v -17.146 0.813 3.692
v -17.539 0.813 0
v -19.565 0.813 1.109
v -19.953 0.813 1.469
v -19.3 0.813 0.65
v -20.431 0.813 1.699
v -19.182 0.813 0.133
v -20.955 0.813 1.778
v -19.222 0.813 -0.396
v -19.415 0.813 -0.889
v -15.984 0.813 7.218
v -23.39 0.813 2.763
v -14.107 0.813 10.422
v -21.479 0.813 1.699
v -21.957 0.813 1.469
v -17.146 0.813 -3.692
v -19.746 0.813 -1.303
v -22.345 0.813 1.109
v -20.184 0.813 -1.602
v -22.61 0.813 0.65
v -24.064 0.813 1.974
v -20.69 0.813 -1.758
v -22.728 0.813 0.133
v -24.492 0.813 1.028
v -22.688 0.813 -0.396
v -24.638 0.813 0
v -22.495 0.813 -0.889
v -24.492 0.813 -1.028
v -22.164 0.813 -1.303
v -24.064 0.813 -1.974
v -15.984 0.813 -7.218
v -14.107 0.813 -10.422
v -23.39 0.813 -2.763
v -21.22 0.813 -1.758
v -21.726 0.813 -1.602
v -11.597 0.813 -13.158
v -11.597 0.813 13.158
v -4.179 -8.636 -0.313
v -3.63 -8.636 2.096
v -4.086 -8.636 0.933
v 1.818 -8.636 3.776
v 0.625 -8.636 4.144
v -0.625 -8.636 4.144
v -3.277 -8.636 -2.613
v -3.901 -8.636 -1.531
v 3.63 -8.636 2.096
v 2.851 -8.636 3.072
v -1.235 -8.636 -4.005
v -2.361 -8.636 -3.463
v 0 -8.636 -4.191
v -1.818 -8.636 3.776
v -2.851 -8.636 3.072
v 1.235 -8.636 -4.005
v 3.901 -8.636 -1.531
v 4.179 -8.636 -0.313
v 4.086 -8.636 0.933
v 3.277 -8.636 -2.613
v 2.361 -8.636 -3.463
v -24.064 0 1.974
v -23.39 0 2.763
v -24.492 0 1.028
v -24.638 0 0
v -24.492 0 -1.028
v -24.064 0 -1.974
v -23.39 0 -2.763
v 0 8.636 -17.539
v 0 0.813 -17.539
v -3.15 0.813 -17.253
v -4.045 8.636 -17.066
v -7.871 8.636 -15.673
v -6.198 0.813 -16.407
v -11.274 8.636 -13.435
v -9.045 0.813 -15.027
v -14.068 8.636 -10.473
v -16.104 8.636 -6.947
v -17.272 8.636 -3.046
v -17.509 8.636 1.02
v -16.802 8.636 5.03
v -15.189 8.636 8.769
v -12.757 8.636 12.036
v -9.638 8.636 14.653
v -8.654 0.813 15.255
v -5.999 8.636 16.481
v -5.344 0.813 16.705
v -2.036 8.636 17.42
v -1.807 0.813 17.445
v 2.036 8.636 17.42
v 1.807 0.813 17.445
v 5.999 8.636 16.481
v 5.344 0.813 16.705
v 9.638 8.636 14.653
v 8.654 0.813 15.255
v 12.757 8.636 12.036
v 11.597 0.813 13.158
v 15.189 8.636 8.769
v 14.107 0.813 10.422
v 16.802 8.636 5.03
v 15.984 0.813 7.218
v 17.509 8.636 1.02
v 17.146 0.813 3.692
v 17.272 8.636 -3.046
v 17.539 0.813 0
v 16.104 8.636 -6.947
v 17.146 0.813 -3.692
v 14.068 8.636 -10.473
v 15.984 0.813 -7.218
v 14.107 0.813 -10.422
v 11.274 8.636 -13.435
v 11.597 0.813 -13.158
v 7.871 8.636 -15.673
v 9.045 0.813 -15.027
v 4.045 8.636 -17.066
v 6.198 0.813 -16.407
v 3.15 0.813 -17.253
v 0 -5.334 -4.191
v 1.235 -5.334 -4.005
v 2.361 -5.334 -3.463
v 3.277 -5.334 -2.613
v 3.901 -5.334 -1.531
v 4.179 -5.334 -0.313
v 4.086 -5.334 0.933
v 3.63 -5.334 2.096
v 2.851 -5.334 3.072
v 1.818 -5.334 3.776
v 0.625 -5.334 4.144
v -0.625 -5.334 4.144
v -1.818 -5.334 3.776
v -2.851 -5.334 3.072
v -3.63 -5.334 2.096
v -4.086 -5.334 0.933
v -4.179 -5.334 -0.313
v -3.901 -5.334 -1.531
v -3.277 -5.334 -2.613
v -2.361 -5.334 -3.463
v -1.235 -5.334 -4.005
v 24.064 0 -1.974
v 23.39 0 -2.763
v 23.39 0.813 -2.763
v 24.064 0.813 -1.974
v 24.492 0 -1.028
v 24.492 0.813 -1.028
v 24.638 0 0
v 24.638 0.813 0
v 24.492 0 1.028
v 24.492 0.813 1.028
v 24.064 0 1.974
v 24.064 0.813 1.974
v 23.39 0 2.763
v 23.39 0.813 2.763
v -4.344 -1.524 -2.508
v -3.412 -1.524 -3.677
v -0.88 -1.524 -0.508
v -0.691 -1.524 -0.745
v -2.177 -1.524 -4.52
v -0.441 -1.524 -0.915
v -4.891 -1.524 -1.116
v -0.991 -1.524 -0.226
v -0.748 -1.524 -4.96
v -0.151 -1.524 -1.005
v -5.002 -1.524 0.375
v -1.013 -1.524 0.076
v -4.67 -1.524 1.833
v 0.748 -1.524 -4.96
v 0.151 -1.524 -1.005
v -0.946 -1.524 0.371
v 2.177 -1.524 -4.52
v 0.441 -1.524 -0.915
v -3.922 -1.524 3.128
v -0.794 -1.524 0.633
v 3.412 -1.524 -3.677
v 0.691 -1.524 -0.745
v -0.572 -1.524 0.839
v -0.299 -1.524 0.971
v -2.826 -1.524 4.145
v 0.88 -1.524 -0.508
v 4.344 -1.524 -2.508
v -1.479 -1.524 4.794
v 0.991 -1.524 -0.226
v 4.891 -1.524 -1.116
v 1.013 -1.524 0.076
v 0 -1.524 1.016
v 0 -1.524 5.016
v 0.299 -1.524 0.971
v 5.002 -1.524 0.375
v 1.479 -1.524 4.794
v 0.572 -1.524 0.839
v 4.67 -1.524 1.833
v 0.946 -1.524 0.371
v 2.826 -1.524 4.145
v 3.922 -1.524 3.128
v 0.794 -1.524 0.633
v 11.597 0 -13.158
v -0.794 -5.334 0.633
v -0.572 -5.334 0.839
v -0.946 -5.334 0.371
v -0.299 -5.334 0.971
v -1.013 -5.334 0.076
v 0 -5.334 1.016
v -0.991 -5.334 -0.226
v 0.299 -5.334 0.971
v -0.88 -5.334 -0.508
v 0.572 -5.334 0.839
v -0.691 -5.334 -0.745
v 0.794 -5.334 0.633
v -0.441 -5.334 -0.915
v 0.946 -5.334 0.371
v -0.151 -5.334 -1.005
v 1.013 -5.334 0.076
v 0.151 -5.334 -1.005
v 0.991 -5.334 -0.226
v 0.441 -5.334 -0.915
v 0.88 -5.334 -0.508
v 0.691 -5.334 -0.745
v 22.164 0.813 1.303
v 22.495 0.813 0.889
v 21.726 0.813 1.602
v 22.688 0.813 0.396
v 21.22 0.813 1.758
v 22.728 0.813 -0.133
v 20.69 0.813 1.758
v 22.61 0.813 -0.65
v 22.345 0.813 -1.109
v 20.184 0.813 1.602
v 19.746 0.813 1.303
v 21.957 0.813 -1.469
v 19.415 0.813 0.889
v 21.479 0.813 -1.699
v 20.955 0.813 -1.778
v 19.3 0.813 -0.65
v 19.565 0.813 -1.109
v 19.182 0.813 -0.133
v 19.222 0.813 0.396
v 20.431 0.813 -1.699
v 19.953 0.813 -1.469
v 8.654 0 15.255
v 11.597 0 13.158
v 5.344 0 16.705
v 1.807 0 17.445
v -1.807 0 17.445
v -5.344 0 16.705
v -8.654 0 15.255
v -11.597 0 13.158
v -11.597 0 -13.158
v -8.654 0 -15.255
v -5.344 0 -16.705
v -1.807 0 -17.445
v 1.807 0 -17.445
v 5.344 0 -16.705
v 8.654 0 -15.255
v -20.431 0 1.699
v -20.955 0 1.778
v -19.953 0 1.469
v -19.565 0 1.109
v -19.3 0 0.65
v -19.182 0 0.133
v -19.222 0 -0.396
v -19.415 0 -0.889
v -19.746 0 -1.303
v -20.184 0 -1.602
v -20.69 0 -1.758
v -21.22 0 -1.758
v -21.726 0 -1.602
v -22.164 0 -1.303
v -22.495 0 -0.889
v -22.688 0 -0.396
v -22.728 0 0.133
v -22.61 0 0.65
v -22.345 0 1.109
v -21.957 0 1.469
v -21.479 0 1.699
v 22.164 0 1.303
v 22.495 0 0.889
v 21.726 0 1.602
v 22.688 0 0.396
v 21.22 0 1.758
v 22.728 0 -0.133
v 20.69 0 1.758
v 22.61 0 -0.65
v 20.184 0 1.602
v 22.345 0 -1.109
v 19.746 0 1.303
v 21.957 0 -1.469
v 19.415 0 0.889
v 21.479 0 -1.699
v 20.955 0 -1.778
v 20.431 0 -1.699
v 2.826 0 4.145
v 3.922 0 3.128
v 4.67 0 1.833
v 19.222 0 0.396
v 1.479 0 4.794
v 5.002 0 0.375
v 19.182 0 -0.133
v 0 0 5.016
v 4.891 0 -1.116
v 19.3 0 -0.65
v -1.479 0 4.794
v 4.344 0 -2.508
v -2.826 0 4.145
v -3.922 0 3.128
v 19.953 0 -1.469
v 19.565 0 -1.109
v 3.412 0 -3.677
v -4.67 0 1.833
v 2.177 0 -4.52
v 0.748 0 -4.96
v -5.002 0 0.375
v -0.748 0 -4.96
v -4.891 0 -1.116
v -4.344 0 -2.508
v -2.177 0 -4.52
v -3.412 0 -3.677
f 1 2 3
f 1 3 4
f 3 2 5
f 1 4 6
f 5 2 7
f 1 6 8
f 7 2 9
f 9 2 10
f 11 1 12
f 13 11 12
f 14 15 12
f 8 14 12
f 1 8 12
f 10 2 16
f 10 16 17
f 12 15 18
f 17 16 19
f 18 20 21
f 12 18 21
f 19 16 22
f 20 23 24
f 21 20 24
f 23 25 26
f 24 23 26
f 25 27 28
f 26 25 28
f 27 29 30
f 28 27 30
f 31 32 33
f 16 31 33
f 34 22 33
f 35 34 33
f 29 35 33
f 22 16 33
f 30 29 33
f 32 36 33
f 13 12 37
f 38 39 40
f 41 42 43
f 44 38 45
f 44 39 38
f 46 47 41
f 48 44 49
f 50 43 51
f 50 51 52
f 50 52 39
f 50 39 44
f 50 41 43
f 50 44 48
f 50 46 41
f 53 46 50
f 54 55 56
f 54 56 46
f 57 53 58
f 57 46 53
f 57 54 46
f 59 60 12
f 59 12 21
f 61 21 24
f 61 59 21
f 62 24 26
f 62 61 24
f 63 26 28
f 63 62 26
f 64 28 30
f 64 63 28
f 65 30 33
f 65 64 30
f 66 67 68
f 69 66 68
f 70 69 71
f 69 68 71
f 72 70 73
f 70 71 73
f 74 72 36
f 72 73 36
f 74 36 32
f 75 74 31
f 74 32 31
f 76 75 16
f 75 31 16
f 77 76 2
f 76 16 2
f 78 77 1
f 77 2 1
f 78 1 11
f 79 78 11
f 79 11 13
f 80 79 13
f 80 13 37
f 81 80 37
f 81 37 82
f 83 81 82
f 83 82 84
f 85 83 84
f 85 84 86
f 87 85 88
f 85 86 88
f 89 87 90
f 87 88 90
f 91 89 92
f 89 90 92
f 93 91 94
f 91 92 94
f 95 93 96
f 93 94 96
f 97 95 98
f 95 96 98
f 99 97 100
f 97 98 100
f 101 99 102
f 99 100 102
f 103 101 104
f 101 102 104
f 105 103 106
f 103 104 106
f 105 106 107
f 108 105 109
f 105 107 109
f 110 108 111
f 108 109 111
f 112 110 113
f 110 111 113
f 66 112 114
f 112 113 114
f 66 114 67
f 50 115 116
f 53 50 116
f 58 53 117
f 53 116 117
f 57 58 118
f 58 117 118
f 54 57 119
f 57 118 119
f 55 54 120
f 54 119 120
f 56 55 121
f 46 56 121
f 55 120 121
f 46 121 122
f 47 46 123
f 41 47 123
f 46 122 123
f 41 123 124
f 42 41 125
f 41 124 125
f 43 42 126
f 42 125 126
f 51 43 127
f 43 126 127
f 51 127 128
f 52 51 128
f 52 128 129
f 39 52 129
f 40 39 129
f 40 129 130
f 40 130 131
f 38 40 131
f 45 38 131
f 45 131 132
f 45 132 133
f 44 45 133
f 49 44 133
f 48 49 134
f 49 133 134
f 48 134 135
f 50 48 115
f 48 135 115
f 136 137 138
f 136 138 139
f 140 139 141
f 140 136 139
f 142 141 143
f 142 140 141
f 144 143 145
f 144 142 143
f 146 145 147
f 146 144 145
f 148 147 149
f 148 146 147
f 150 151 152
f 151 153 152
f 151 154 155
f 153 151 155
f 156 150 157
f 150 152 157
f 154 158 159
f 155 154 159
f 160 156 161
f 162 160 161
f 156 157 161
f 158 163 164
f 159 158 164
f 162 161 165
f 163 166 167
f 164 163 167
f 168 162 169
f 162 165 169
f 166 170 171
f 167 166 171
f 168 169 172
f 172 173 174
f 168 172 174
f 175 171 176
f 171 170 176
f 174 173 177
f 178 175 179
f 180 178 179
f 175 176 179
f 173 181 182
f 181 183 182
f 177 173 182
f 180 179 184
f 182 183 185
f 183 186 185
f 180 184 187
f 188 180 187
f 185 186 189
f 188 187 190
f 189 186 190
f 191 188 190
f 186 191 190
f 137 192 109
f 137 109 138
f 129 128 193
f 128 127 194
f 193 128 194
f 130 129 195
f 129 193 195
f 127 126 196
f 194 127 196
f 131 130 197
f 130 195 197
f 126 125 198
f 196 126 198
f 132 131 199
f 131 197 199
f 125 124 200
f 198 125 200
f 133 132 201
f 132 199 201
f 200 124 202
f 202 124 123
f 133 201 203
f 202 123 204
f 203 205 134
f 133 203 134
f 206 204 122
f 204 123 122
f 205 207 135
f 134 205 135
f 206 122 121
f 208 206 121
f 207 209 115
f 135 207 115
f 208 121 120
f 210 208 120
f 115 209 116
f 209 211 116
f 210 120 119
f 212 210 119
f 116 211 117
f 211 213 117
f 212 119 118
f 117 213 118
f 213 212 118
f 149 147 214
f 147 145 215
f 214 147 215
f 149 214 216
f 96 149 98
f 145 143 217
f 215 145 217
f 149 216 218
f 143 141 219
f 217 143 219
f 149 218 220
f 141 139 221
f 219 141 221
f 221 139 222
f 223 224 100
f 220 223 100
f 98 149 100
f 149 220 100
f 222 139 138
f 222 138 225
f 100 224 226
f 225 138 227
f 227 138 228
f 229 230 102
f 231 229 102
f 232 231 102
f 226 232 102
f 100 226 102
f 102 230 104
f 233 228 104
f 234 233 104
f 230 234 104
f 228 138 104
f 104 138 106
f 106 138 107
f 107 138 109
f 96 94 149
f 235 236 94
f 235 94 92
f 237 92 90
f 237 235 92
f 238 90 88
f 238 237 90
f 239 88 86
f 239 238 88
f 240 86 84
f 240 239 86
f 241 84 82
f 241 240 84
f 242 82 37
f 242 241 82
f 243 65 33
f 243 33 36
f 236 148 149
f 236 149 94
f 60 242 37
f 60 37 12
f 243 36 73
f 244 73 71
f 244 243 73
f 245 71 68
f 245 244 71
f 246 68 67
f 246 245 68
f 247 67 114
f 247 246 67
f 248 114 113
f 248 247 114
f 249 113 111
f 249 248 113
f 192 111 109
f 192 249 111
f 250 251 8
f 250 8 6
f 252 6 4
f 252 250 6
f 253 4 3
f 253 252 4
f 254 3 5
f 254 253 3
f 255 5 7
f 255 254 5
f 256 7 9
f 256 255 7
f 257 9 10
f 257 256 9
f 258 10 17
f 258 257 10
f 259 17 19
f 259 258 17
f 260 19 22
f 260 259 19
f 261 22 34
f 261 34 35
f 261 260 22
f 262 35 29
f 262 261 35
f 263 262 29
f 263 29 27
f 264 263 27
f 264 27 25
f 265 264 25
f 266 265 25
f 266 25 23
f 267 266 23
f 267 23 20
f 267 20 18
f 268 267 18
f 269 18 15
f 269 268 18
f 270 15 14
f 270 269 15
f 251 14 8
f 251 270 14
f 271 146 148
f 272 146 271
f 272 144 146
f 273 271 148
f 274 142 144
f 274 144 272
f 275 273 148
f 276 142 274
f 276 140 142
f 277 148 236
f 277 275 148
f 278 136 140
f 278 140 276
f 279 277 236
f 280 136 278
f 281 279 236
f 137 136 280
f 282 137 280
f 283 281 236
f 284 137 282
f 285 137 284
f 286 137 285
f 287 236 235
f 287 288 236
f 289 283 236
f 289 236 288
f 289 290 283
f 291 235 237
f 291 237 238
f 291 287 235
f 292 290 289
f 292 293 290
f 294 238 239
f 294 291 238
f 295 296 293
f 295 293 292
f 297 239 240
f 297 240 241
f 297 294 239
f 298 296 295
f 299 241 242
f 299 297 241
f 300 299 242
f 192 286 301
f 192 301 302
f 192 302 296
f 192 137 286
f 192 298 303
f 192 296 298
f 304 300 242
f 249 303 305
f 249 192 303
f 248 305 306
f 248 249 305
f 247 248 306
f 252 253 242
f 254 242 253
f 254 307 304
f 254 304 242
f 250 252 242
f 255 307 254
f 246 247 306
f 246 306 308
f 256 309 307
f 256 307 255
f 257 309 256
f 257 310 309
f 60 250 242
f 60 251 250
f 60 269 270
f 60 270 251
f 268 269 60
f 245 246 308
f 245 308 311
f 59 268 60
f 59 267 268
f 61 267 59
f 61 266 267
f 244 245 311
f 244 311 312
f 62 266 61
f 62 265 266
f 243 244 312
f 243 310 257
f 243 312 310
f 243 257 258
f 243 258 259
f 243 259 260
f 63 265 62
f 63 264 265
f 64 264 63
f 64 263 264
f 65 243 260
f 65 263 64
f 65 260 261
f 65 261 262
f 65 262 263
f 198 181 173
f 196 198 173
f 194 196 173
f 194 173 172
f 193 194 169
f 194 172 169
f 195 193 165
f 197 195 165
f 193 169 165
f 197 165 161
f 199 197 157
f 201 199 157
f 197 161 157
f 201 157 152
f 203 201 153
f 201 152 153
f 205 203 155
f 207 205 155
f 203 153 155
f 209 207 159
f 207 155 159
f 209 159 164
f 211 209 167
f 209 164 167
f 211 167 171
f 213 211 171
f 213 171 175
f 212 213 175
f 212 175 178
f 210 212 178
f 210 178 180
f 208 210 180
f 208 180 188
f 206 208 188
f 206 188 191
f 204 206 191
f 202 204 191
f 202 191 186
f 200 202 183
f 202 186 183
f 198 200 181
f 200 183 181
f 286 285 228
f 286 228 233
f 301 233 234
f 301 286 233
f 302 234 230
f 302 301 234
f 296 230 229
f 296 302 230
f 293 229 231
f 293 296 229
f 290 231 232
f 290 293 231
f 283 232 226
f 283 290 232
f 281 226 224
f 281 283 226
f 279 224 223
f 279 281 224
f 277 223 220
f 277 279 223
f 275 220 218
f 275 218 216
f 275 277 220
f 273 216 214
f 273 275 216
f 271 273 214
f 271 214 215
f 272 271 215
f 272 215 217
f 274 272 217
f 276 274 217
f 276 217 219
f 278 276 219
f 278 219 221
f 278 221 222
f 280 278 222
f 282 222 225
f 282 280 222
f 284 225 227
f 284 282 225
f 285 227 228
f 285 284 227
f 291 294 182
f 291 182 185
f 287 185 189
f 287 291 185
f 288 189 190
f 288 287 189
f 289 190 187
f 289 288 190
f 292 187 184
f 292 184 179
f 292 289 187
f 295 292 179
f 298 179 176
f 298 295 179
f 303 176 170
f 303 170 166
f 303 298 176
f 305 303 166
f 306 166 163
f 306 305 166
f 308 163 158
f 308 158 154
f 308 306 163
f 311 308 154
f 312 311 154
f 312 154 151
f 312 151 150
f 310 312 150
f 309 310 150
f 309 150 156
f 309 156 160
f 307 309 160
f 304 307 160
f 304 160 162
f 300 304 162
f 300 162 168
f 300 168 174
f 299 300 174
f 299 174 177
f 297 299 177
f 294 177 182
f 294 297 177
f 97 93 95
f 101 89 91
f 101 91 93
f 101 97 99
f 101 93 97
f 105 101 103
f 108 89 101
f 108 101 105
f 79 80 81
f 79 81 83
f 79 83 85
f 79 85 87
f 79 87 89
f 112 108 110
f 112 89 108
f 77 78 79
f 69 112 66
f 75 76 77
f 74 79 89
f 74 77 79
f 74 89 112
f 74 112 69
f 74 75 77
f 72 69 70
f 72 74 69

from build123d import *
from build123d.topology import SkipClean

# Parameters (mm, degrees)
SKETCH1_R           = 1.778
BOSS_EXTRUDE1_DEPTH = 0.8128
SKETCH2_R           = 17.5387
BOSS_EXTRUDE2_DEPTH = 7.8232
SKETCH3_R           = 5.0165
BOSS_EXTRUDE3_DEPTH = 1.524
SKETCH5_R           = 1.016
BOSS_EXTRUDE4_DEPTH = 3.81
SKETCH6_R           = 4.191
BOSS_EXTRUDE5_DEPTH = 3.302


with BuildPart() as part:
    # Sketch1 → Boss-Extrude1 (new body)
    with BuildSketch(Plane(origin=(0, 0, 0), x_dir=(1, 0, 0), z_dir=(0, 1, 0))):
        with BuildLine():
            Line((-23.390244242, 2.762982895), (-11.59680103, 13.157515098))
            ThreePointArc((-11.59680103, 13.157515098), (0, 17.5387), (11.59680103, 13.157515098))
            Line((11.59680103, 13.157515098), (23.390244242, 2.762982895))
            ThreePointArc((23.390244242, 2.762982895), (24.638, 0), (23.390244242, -2.762982895))
            Line((23.390244242, -2.762982895), (11.59680103, -13.157515098))
            ThreePointArc((11.59680103, -13.157515098), (0, -17.5387), (-11.59680103, -13.157515098))
            Line((-11.59680103, -13.157515098), (-23.390244242, -2.762982895))
            ThreePointArc((-23.390244242, -2.762982895), (-24.638, 0), (-23.390244242, 2.762982895))
        make_face()
        with Locations(Location((-20.955, 0, 0), (0, 0, 270))):
            Circle(SKETCH1_R, mode=Mode.SUBTRACT)
        with Locations(Location((20.955, 0, 0), (0, 0, 90))):
            Circle(SKETCH1_R, mode=Mode.SUBTRACT)
    extrude(amount=BOSS_EXTRUDE1_DEPTH)

    # Sketch2 → Boss-Extrude2 (add)
    with SkipClean():  # the faces are left unmerged after this step: merging them gives an invalid solid
        with BuildSketch(Plane(origin=(0, 0.8128, 0), x_dir=(1, 0, 0), z_dir=(0, 1, 0))):
            with Locations(Location((0, 0, 0), (0, 0, 90))):
                Circle(SKETCH2_R)
        extrude(amount=BOSS_EXTRUDE2_DEPTH)

    # Sketch3 → Boss-Extrude3 (add)
    with SkipClean():  # the faces are left unmerged after this step: merging them gives an invalid solid
        with BuildSketch(Plane(origin=(0, 0, 0), x_dir=(1, 0, 0), z_dir=(0, 1, 0))):
            with Locations(Location((0, 0, 0), (0, 0, 270))):
                Circle(SKETCH3_R)
        extrude(amount=-BOSS_EXTRUDE3_DEPTH)

    # Sketch5 → Boss-Extrude4 (add)
    with SkipClean():  # the faces are left unmerged after this step: merging them gives an invalid solid
        with BuildSketch(Plane.XZ.offset(1.524)):
            with Locations(Location((0, 0, 0), (0, 0, 90))):
                Circle(SKETCH5_R)
        extrude(amount=BOSS_EXTRUDE4_DEPTH)

    # Sketch6 → Boss-Extrude5 (add)
    with SkipClean():  # the faces are left unmerged after this step: merging them gives an invalid solid
        with BuildSketch(Plane.XZ.offset(5.334)):
            with Locations(Location((0, 0, 0), (0, 0, 270))):
                Circle(SKETCH6_R)
        extrude(amount=BOSS_EXTRUDE5_DEPTH)


solid = part.part
